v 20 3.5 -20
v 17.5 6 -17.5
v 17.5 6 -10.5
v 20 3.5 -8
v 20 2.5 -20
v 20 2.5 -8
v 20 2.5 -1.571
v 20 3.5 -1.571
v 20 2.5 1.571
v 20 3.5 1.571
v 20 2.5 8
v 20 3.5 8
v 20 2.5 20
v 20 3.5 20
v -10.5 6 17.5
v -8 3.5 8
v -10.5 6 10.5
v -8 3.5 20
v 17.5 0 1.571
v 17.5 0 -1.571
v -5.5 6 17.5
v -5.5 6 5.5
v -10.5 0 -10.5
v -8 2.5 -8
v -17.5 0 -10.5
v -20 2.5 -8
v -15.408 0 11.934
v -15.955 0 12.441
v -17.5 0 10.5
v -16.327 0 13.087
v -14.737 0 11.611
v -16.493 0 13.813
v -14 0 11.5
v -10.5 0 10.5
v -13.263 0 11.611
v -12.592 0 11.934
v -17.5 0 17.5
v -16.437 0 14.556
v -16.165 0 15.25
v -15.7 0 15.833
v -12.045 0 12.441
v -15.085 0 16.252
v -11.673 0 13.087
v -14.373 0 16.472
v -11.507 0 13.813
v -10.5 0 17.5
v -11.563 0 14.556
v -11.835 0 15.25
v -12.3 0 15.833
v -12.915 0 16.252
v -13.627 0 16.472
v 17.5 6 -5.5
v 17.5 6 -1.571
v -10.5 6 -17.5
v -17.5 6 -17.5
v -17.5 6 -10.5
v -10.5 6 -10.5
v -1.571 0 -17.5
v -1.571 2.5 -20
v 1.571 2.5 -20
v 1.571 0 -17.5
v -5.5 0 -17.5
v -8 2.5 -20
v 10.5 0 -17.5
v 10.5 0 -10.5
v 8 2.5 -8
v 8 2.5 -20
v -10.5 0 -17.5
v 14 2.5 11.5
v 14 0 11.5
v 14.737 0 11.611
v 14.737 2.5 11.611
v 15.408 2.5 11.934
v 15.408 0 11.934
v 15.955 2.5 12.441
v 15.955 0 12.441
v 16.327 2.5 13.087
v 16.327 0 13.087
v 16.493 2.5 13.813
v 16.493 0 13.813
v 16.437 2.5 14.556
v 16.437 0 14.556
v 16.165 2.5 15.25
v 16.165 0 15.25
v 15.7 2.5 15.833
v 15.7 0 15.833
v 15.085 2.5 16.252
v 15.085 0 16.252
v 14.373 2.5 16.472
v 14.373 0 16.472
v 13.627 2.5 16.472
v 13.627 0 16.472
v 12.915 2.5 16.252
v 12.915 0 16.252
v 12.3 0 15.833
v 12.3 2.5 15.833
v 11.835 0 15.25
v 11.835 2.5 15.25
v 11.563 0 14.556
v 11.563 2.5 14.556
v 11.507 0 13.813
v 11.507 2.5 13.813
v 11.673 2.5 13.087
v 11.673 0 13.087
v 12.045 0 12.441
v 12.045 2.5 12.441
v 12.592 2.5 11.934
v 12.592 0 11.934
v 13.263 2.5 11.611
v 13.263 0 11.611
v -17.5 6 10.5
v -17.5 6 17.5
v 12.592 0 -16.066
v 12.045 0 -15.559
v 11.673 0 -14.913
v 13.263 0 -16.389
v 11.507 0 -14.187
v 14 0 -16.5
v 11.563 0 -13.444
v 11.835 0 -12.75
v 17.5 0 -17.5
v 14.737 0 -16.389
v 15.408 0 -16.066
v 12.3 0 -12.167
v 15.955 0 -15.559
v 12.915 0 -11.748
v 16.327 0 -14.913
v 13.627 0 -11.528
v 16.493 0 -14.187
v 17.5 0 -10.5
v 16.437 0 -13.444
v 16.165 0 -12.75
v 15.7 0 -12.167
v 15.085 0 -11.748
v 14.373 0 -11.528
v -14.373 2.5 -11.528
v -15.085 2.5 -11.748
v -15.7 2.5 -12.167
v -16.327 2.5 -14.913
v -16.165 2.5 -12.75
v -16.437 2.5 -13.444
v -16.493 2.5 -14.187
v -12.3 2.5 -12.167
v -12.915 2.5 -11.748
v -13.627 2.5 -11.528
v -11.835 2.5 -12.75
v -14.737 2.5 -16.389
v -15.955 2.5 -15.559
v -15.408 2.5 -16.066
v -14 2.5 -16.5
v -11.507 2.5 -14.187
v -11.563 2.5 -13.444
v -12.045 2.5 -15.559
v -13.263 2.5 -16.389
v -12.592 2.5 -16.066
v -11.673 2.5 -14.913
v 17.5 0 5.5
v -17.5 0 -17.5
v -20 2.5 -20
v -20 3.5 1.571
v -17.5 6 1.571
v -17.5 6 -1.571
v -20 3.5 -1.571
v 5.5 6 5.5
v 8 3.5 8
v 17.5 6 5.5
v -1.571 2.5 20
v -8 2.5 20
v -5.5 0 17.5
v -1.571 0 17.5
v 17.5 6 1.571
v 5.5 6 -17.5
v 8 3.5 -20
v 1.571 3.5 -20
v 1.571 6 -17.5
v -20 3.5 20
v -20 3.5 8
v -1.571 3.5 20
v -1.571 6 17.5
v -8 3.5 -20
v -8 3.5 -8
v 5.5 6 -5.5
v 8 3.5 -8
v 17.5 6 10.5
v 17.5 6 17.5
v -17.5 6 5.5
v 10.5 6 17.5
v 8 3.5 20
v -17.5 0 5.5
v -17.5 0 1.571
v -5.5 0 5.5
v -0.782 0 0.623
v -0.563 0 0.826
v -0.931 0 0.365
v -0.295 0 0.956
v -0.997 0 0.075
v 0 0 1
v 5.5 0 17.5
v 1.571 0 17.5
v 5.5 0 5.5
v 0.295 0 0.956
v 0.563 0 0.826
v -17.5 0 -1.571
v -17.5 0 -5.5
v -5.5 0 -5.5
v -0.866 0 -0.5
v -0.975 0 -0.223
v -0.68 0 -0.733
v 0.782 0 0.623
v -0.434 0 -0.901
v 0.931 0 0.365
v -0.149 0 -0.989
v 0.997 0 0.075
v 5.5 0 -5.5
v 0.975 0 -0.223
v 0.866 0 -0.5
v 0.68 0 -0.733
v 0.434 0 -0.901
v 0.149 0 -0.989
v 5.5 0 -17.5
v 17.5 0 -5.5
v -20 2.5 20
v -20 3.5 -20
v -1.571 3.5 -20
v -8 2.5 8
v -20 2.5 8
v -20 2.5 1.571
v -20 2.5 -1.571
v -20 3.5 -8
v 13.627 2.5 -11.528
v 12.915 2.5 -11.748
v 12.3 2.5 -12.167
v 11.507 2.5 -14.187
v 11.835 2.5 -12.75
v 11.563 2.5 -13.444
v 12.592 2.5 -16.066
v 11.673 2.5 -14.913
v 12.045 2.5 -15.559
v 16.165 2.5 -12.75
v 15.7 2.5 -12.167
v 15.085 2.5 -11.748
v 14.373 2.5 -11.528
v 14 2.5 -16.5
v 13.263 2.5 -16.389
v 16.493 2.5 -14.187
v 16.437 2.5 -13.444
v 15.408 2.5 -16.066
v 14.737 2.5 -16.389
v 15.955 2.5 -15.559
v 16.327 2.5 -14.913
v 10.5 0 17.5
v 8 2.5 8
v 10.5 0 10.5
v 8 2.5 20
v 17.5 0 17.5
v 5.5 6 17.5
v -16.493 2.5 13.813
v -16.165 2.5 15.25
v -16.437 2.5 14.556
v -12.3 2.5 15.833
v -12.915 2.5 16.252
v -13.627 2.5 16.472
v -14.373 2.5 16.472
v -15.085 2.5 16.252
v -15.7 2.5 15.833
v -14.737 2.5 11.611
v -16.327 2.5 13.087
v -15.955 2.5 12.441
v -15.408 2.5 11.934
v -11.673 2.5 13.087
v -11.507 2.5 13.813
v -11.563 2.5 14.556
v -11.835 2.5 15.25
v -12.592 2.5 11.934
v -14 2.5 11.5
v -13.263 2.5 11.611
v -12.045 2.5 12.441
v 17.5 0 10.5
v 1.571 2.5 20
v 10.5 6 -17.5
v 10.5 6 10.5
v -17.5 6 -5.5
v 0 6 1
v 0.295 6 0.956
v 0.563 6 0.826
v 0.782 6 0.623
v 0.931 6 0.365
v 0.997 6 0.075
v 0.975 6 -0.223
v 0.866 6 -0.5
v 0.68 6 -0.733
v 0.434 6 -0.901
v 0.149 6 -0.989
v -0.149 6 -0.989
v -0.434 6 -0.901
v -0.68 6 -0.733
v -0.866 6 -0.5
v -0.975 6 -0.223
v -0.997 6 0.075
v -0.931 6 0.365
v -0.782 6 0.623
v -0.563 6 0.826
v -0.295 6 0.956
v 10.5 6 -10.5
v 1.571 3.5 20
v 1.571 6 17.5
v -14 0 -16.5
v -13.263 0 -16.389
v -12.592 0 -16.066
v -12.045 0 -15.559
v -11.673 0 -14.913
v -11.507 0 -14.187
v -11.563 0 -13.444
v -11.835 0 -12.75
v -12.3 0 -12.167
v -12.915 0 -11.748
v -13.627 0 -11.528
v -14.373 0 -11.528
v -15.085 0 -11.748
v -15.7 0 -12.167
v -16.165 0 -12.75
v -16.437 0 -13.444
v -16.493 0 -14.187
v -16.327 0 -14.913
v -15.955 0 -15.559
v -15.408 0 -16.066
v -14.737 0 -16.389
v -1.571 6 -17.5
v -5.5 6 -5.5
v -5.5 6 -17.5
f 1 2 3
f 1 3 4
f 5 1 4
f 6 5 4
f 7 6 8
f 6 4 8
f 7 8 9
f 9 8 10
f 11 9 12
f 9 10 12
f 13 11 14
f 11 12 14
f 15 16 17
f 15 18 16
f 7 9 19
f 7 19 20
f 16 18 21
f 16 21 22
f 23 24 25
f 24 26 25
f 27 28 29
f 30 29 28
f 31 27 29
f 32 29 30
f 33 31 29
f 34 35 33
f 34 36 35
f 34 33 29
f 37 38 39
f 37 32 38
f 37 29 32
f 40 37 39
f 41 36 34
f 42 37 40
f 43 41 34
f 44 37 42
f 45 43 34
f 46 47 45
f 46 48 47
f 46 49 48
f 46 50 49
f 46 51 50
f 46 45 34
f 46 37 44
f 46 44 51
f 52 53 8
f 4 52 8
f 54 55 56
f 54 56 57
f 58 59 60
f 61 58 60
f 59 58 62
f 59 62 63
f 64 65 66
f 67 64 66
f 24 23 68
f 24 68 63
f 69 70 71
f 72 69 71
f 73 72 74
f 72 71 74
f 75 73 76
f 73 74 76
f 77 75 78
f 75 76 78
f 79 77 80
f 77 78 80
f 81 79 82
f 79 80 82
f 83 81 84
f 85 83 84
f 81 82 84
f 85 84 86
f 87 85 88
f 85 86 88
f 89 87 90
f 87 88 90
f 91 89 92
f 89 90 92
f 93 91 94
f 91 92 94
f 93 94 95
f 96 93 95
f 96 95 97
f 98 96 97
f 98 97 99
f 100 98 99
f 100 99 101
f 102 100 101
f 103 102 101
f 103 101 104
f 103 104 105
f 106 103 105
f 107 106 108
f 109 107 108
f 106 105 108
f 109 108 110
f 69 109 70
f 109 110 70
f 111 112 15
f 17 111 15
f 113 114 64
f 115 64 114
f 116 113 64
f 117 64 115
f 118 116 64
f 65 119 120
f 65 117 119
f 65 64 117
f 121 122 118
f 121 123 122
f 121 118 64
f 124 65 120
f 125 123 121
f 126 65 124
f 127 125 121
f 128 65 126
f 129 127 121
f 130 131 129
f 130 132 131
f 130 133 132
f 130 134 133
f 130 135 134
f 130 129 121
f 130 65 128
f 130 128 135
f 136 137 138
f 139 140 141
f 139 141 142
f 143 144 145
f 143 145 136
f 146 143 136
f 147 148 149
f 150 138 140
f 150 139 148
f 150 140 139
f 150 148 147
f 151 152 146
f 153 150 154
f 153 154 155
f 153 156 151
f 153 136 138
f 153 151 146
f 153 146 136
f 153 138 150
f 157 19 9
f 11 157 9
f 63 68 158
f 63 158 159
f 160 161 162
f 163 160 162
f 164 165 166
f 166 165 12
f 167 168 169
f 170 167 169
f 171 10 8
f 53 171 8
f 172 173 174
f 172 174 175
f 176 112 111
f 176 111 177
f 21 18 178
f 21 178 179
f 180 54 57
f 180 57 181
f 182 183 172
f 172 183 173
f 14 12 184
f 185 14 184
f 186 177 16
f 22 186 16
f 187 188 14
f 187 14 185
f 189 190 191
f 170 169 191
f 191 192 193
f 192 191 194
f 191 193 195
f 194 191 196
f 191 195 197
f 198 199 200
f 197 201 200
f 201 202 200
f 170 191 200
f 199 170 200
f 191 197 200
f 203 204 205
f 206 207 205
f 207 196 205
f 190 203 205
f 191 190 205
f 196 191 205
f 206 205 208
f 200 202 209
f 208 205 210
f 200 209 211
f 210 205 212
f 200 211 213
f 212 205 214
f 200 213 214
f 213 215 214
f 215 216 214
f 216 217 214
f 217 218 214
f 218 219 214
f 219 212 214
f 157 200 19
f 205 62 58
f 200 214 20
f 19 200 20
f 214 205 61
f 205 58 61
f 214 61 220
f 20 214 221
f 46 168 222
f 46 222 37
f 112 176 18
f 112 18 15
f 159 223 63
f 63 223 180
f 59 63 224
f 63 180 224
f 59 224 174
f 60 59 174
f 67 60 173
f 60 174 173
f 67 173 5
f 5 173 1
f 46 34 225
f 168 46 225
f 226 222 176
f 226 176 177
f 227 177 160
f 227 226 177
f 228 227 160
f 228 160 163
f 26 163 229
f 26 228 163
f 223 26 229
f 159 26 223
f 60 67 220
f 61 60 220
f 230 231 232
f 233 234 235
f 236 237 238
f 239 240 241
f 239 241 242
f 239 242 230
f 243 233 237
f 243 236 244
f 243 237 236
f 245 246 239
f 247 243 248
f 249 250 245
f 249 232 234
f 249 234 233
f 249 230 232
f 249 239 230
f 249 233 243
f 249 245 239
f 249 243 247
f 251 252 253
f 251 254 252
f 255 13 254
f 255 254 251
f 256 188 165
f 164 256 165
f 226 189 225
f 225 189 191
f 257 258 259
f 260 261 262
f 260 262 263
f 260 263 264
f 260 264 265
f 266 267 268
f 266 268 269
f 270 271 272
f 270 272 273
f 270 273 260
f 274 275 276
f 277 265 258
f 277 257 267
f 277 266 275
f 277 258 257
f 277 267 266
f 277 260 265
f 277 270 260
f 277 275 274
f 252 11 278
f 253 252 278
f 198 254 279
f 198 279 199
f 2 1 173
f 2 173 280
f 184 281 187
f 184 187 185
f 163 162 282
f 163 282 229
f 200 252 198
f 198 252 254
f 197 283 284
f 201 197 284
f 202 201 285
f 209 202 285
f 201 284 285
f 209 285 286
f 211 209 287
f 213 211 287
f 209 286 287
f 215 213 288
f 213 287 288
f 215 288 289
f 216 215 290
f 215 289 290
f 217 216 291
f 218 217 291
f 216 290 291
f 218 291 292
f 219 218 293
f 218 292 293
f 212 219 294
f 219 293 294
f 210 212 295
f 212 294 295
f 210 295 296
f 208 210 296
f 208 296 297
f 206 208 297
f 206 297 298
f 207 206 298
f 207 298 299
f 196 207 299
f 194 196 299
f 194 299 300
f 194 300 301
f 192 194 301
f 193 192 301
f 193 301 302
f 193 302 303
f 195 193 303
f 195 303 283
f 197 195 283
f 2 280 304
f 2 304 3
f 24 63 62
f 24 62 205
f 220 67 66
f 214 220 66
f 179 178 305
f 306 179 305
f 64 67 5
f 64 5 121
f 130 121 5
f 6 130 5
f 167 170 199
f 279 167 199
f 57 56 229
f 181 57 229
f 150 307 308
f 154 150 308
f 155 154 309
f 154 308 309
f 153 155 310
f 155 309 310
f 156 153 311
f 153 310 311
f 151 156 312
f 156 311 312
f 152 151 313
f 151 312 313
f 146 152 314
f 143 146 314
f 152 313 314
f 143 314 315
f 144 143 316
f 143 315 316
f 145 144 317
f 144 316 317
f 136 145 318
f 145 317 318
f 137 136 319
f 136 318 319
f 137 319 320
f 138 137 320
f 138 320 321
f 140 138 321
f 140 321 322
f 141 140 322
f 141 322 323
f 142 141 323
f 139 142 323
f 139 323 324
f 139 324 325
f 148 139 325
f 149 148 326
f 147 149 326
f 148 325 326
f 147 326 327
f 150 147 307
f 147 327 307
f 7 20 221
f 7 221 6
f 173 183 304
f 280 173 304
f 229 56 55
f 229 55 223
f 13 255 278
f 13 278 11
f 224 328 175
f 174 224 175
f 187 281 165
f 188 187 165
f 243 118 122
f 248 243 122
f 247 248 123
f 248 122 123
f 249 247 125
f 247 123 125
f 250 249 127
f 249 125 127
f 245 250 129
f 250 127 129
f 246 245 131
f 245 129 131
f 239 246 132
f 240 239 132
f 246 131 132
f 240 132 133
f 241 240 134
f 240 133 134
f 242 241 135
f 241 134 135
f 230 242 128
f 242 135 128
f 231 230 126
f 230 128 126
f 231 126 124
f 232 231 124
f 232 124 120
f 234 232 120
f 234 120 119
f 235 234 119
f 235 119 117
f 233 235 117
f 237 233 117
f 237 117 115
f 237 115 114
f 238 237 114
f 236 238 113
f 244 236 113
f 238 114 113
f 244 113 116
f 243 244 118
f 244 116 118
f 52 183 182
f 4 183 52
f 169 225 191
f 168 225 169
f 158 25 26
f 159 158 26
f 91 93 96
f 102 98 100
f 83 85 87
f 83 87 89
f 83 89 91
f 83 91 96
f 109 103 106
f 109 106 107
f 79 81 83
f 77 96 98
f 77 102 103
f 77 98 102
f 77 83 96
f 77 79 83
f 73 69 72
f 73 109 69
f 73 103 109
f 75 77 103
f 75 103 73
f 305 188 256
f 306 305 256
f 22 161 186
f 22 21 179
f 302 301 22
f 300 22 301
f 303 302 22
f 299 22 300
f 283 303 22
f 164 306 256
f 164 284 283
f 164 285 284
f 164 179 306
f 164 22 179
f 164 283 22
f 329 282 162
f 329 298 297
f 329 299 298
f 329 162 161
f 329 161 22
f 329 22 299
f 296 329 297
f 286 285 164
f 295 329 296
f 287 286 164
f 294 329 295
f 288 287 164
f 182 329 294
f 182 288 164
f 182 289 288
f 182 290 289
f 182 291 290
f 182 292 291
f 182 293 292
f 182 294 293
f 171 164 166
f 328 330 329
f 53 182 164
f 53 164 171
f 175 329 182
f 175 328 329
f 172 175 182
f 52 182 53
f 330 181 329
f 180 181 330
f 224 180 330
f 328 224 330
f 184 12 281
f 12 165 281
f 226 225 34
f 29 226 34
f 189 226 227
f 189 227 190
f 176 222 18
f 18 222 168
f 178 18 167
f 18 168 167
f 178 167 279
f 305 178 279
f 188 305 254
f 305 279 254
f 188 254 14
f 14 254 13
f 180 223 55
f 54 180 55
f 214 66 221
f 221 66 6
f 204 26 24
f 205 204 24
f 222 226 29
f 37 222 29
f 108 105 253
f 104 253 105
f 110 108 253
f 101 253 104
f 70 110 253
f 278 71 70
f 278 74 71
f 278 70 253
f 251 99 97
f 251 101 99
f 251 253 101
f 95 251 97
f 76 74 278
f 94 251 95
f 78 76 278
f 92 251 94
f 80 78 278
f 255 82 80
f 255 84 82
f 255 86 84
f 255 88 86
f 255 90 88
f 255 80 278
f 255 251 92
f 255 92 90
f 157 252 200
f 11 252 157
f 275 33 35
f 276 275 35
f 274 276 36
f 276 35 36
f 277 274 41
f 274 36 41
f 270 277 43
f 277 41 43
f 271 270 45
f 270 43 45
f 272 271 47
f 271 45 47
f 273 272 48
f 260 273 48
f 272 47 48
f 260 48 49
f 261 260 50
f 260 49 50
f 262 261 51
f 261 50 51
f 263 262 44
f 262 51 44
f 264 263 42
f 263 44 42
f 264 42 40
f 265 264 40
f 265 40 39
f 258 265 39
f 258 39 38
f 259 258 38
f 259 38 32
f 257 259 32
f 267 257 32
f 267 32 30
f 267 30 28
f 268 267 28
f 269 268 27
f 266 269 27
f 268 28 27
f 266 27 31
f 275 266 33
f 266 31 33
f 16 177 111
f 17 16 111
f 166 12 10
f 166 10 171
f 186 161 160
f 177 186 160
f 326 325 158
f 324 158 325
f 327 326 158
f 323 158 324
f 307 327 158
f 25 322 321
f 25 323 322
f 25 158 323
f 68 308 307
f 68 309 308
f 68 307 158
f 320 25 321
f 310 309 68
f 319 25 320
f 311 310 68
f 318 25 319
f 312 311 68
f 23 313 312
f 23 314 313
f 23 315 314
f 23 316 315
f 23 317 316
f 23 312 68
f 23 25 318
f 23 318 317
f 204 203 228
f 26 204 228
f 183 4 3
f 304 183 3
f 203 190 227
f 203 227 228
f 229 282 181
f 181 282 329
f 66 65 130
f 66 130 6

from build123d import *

# Parameters (mm, degrees)
SKETCH1_W           = 40
SKETCH1_H           = 40
BOSS_EXTRUDE1_DEPTH = 6
SKETCH2_W           = 12
SKETCH2_H           = 12
CUT_EXTRUDE1_DEPTH  = 2.5
SKETCH3_W           = 12
SKETCH3_H           = 12
CUT_EXTRUDE2_DEPTH  = 2.5
CHAMFER1_SIZE       = 2.5
SKETCH4_W           = 12
SKETCH4_H           = 12
BOSS_EXTRUDE2_DEPTH = 2.5
SKETCH5_W           = 12
SKETCH5_H           = 12
BOSS_EXTRUDE3_DEPTH = 2.5
CHAMFER2_SIZE       = 2.5
SKETCH6_R           = 2.5
CUT_EXTRUDE3_DEPTH  = 2.5
SKETCH7_R           = 1
CUT_EXTRUDE4_DEPTH  = 29.91366459


# Some blends are built 0.0001 mm under size
with BuildPart() as part:
    # Sketch1 → Boss-Extrude1 (new body)
    with BuildSketch(Plane(origin=(0, 0, 0), x_dir=(1, 0, 0), z_dir=(0, 1, 0))):
        Rectangle(SKETCH1_W, SKETCH1_H)
    extrude(amount=BOSS_EXTRUDE1_DEPTH)

    # Sketch2 → Cut-Extrude1 (cut)
    with BuildSketch(Plane.XZ):
        with Locations((14, 14)):
            Rectangle(SKETCH2_W, SKETCH2_H)
        with Locations((-14, 14)):
            Rectangle(SKETCH2_W, SKETCH2_H)
        with Locations((14, -14)):
            Rectangle(SKETCH2_W, SKETCH2_H)
        with Locations((-14, -14)):
            Rectangle(SKETCH2_W, SKETCH2_H)
    extrude(amount=-CUT_EXTRUDE1_DEPTH, mode=Mode.SUBTRACT)

    # Sketch3 → Cut-Extrude2 (cut)
    with BuildSketch(Plane(origin=(0, 6, 0), x_dir=(1, 0, 0), z_dir=(0, 1, 0))):
        with Locations((14, 14)):
            Rectangle(SKETCH3_W, SKETCH3_H)
        with Locations((-14, 14)):
            Rectangle(SKETCH3_W, SKETCH3_H)
        with Locations((14, -14)):
            Rectangle(SKETCH3_W, SKETCH3_H)
        with Locations((-14, -14)):
            Rectangle(SKETCH3_W, SKETCH3_H)
    extrude(amount=-CUT_EXTRUDE2_DEPTH, mode=Mode.SUBTRACT)

    # Chamfer1
    chamfer1_edges = [part.edges().sort_by_distance(p)[0] for p in [
        (-14, 6, -8),
        (-8, 6, -14),
        (0, 6, -20),
        (8, 6, -14),
        (14, 6, -8),
        (20, 6, 0),
        (14, 6, 8),
        (8, 6, 14),
        (0, 6, 20),
        (-8, 6, 14),
        (-14, 6, 8),
        (-20, 6, 0),
        (-20, 0, 0),
        (-14, 0, 8),
        (-8, 0, 14),
        (0, 0, 20),
        (8, 0, 14),
        (14, 0, 8),
        (20, 0, 0),
        (14, 0, -8),
        (8, 0, -14),
        (0, 0, -20),
        (-8, 0, -14),
        (-14, 0, -8),
    ]]
    chamfer(chamfer1_edges, length=CHAMFER1_SIZE - 0.0001)  # a hair under: the kernel refuses the full size

    # Sketch4 → Boss-Extrude2 (add)
    with BuildSketch(Plane.XZ.offset(-2.5)):
        with Locations((14, -14)):
            Rectangle(SKETCH4_W, SKETCH4_H)
        with Locations((14, 14)):
            Rectangle(SKETCH4_W, SKETCH4_H)
        with Locations((-14, -14)):
            Rectangle(SKETCH4_W, SKETCH4_H)
        with Locations((-14, 14)):
            Rectangle(SKETCH4_W, SKETCH4_H)
    extrude(amount=BOSS_EXTRUDE2_DEPTH)

    # Sketch5 → Boss-Extrude3 (add)
    with BuildSketch(Plane(origin=(0, 3.5, 0), x_dir=(1, 0, 0), z_dir=(0, 1, 0))):
        with Locations((-14, -14)):
            Rectangle(SKETCH5_W, SKETCH5_H)
        with Locations((14, -14)):
            Rectangle(SKETCH5_W, SKETCH5_H)
        with Locations((-14, 14)):
            Rectangle(SKETCH5_W, SKETCH5_H)
        with Locations((14, 14)):
            Rectangle(SKETCH5_W, SKETCH5_H)
    extrude(amount=BOSS_EXTRUDE3_DEPTH)

    # Chamfer2
    # the kernel refuses this chamfer: 2.5 mm, written as the material it takes off along each edge
    with BuildSketch(Plane(origin=(8, 6, 8), x_dir=(0, -0.9996219169112968, -0.027495876610586317), z_dir=(1, 0, 0)), Plane(origin=(-26.42920747, 0, -8), x_dir=(0, 0.9996219169112968, 0.027495876610586317), z_dir=(1, 0, 0)), Plane(origin=(-8, 0, 8), x_dir=(0, 0.9996219169112968, -0.027495876610586317), z_dir=(-1, 0, 0)), Plane(origin=(-26.42920747, 6, -8), x_dir=(6.9547671466025935e-15, 0.027495876610586317, -0.9996219169112968), z_dir=(1, 0, 0))) as chamfer2_piece_1:
        Polygon((CHAMFER2_SIZE * 0.999621916911, -CHAMFER2_SIZE * 0.0274958766106), (-CHAMFER2_SIZE * 0.0274958766106, -CHAMFER2_SIZE * 0.999621916911), (0, 0), align=None)
    extrude(amount=18.42920747, mode=Mode.SUBTRACT)
    with BuildSketch(Plane(origin=(20, 6, 1.57079253), x_dir=(0.027495876610586317, -0.9996219169112968, -1.2780451150309794e-15), z_dir=(0, 0, 1)), Plane(origin=(26.42920747, 6, 20), x_dir=(0, -0.9996219169112968, 0.027495876610586317), z_dir=(-1, 0, 0)), Plane(origin=(-20, 0, 1.57079253), x_dir=(-0.027495876610586317, 0.9996219169112968, 0), z_dir=(0, 0, 1)), Plane(origin=(-26.42920747, 0, 20), x_dir=(0, 0.9996219169112968, 0.027495876610586317), z_dir=(1, 0, 0)), Plane(origin=(20, 0, 1.57079253), x_dir=(-0.9996219169112968, -0.027495876610586372, 0), z_dir=(0, 0, 1)), Plane(origin=(26.42920747, 0, -20), x_dir=(0, 0.9996219169112968, -0.027495876610586317), z_dir=(-1, 0, 0)), Plane(origin=(20, 6, -1.57079253), x_dir=(-0.9996219169112968, 0.027495876610586317, -1.0358163835365089e-14), z_dir=(0, 0, -1)), Plane(origin=(-20, 6, -26.42920747), x_dir=(0.9996219169112968, 0.027495876610586317, -3.936102257438915e-14), z_dir=(0, 0, 1)), Plane(origin=(-20, 6, 1.57079253), x_dir=(0.9996219169112968, 0.027495876610586317, 3.5513704578394593e-15), z_dir=(0, 0, 1))) as chamfer2_piece_2:
        Polygon((CHAMFER2_SIZE * 0.999621916911, -CHAMFER2_SIZE * 0.0274958766106), (-CHAMFER2_SIZE * 0.0274958766106, -CHAMFER2_SIZE * 0.999621916911), (0, 0), align=None)
    extrude(amount=24.85841494, mode=Mode.SUBTRACT)
    with BuildSketch(Plane(origin=(8, 6, 26.42920747), x_dir=(0.9996219169112968, 0.027495876610586317, 0), z_dir=(0, 0, -1)), Plane(origin=(-8, 0, -8), x_dir=(-0.9996219169112968, -0.02749587661058636, 0), z_dir=(0, 0, -1)), Plane(origin=(-8, 0, 26.42920747), x_dir=(-0.9996219169112968, -0.027495876610586372, 0), z_dir=(0, 0, -1)), Plane(origin=(8, 0, 26.42920747), x_dir=(-0.027495876610586317, 0.9996219169112968, 0), z_dir=(0, 0, -1)), Plane(origin=(8, 0, -8), x_dir=(0, -0.027495876610586372, -0.9996219169112968), z_dir=(1, 0, 0)), Plane(origin=(8, 0, -26.42920747), x_dir=(0.9996219169112968, -0.027495876610586372, 0), z_dir=(0, 0, 1)), Plane(origin=(8, 6, -8), x_dir=(0, -0.9996219169112968, 0.027495876610586317), z_dir=(1, 0, 0)), Plane(origin=(8, 6, -26.42920747), x_dir=(-0.027495876610586317, -0.9996219169112968, 0), z_dir=(0, 0, 1)), Plane(origin=(-8, 6, 8), x_dir=(0, -0.9996219169112968, -0.027495876610586317), z_dir=(-1, 0, 0)), Plane(origin=(-8, 6, 26.42920747), x_dir=(0.027495876610586317, -0.9996219169112968, 0), z_dir=(0, 0, -1))) as chamfer2_piece_3:
        Polygon((CHAMFER2_SIZE * 0.999621916911, CHAMFER2_SIZE * 0.0274958766106), (-CHAMFER2_SIZE * 0.0274958766106, CHAMFER2_SIZE * 0.999621916911), (0, 0), align=None)
    extrude(amount=18.42920747, mode=Mode.SUBTRACT)
    with BuildSketch(Plane(origin=(-1.57079253, 0, -20), x_dir=(0, -0.027495876610586372, 0.9996219169112968), z_dir=(-1, 0, 0)), Plane(origin=(-20, 0, -26.42920747), x_dir=(0.9996219169112968, -0.027495876610586372, -6.510845839372511e-15), z_dir=(0, 0, 1)), Plane(origin=(26.42920747, 0, 20), x_dir=(0, 0.9996219169112968, 0.027495876610586317), z_dir=(-1, 0, 0)), Plane(origin=(20, 0, -1.57079253), x_dir=(-0.9996219169112968, -0.027495876610586372, 0), z_dir=(0, 0, -1)), Plane(origin=(26.42920747, 6, -20), x_dir=(0, -0.9996219169112968, -0.027495876610586317), z_dir=(-1, 0, 0)), Plane(origin=(-1.57079253, 6, -20), x_dir=(0, -0.9996219169112968, -0.027495876610586317), z_dir=(-1, 0, 0)), Plane(origin=(-26.42920747, 6, 20), x_dir=(1.1722197233405161e-15, -0.9996219169112968, 0.027495876610586317), z_dir=(1, 0, 0))) as chamfer2_piece_4:
        Polygon((CHAMFER2_SIZE * 0.999621916911, CHAMFER2_SIZE * 0.0274958766106), (-CHAMFER2_SIZE * 0.0274958766106, CHAMFER2_SIZE * 0.999621916911), (0, 0), align=None)
    extrude(amount=24.85841494, mode=Mode.SUBTRACT)
    with BuildSketch(Plane(origin=(1.57079253, 0, 8), x_dir=(0, 0.9996219169112968, -0.027495876610586317), z_dir=(1, 0, 0))) as chamfer2_piece_5_section:
        Polygon((CHAMFER2_SIZE * 0.999621916911, CHAMFER2_SIZE * 0.0274958766106), (-CHAMFER2_SIZE * 0.0274958766106, CHAMFER2_SIZE * 0.999621916911), (0, 0), align=None)
    chamfer2_piece_5 = extrude(amount=24.85841494, mode=Mode.PRIVATE)
    chamfer2_piece_5 = split(chamfer2_piece_5, bisect_by=Plane(origin=(9.775276368, 4.275176368, 8.816532421), z_dir=(0.7071067811865475, -0.7071067811865476, -2.3845673236902997e-15)), keep=Keep.TOP, mode=Mode.PRIVATE)
    add(chamfer2_piece_5, mode=Mode.SUBTRACT)
    with BuildSketch(Plane(origin=(-8, 6, -1.57079253), x_dir=(-0.9996219169112968, 0.027495876610586317, -7.028754031140922e-15), z_dir=(0, 0, -1))) as chamfer2_piece_6_section:
        Polygon((CHAMFER2_SIZE * 0.999621916911, -CHAMFER2_SIZE * 0.0274958766106), (-CHAMFER2_SIZE * 0.0274958766106, -CHAMFER2_SIZE * 0.999621916911), (0, 0), align=None)
    chamfer2_piece_6 = extrude(amount=24.85841494, mode=Mode.PRIVATE)
    chamfer2_piece_6 = split(chamfer2_piece_6, bisect_by=Plane(origin=(-8.816532421, 1.724823632, -9.775276368), z_dir=(0, 0.7071067811865476, -0.7071067811865475)), keep=Keep.TOP, mode=Mode.PRIVATE)
    add(chamfer2_piece_6, mode=Mode.SUBTRACT)

    # Sketch6 → Cut-Extrude3 (cut)
    with BuildSketch(Plane.XZ):
        with Locations(Location((14, 14, 0), (0, 0, 270))):
            Circle(SKETCH6_R)
        with Locations(Location((14, -14, 0), (0, 0, 270))):
            Circle(SKETCH6_R)
        with Locations(Location((-14, -14, 0), (0, 0, 270))):
            Circle(SKETCH6_R)
        with Locations(Location((-14, 14, 0), (0, 0, 270))):
            Circle(SKETCH6_R)
    extrude(amount=-CUT_EXTRUDE3_DEPTH, mode=Mode.SUBTRACT)

    # Sketch7 → Cut-Extrude4 (cut, through all)
    with BuildSketch(Plane(origin=(0, 6, 0), x_dir=(1, 0, 0), z_dir=(0, 1, 0))):
        with Locations(Location((0, 0, 0), (0, 0, 270))):
            Circle(SKETCH7_R)
    extrude(amount=-CUT_EXTRUDE4_DEPTH, mode=Mode.SUBTRACT)


solid = part.part
